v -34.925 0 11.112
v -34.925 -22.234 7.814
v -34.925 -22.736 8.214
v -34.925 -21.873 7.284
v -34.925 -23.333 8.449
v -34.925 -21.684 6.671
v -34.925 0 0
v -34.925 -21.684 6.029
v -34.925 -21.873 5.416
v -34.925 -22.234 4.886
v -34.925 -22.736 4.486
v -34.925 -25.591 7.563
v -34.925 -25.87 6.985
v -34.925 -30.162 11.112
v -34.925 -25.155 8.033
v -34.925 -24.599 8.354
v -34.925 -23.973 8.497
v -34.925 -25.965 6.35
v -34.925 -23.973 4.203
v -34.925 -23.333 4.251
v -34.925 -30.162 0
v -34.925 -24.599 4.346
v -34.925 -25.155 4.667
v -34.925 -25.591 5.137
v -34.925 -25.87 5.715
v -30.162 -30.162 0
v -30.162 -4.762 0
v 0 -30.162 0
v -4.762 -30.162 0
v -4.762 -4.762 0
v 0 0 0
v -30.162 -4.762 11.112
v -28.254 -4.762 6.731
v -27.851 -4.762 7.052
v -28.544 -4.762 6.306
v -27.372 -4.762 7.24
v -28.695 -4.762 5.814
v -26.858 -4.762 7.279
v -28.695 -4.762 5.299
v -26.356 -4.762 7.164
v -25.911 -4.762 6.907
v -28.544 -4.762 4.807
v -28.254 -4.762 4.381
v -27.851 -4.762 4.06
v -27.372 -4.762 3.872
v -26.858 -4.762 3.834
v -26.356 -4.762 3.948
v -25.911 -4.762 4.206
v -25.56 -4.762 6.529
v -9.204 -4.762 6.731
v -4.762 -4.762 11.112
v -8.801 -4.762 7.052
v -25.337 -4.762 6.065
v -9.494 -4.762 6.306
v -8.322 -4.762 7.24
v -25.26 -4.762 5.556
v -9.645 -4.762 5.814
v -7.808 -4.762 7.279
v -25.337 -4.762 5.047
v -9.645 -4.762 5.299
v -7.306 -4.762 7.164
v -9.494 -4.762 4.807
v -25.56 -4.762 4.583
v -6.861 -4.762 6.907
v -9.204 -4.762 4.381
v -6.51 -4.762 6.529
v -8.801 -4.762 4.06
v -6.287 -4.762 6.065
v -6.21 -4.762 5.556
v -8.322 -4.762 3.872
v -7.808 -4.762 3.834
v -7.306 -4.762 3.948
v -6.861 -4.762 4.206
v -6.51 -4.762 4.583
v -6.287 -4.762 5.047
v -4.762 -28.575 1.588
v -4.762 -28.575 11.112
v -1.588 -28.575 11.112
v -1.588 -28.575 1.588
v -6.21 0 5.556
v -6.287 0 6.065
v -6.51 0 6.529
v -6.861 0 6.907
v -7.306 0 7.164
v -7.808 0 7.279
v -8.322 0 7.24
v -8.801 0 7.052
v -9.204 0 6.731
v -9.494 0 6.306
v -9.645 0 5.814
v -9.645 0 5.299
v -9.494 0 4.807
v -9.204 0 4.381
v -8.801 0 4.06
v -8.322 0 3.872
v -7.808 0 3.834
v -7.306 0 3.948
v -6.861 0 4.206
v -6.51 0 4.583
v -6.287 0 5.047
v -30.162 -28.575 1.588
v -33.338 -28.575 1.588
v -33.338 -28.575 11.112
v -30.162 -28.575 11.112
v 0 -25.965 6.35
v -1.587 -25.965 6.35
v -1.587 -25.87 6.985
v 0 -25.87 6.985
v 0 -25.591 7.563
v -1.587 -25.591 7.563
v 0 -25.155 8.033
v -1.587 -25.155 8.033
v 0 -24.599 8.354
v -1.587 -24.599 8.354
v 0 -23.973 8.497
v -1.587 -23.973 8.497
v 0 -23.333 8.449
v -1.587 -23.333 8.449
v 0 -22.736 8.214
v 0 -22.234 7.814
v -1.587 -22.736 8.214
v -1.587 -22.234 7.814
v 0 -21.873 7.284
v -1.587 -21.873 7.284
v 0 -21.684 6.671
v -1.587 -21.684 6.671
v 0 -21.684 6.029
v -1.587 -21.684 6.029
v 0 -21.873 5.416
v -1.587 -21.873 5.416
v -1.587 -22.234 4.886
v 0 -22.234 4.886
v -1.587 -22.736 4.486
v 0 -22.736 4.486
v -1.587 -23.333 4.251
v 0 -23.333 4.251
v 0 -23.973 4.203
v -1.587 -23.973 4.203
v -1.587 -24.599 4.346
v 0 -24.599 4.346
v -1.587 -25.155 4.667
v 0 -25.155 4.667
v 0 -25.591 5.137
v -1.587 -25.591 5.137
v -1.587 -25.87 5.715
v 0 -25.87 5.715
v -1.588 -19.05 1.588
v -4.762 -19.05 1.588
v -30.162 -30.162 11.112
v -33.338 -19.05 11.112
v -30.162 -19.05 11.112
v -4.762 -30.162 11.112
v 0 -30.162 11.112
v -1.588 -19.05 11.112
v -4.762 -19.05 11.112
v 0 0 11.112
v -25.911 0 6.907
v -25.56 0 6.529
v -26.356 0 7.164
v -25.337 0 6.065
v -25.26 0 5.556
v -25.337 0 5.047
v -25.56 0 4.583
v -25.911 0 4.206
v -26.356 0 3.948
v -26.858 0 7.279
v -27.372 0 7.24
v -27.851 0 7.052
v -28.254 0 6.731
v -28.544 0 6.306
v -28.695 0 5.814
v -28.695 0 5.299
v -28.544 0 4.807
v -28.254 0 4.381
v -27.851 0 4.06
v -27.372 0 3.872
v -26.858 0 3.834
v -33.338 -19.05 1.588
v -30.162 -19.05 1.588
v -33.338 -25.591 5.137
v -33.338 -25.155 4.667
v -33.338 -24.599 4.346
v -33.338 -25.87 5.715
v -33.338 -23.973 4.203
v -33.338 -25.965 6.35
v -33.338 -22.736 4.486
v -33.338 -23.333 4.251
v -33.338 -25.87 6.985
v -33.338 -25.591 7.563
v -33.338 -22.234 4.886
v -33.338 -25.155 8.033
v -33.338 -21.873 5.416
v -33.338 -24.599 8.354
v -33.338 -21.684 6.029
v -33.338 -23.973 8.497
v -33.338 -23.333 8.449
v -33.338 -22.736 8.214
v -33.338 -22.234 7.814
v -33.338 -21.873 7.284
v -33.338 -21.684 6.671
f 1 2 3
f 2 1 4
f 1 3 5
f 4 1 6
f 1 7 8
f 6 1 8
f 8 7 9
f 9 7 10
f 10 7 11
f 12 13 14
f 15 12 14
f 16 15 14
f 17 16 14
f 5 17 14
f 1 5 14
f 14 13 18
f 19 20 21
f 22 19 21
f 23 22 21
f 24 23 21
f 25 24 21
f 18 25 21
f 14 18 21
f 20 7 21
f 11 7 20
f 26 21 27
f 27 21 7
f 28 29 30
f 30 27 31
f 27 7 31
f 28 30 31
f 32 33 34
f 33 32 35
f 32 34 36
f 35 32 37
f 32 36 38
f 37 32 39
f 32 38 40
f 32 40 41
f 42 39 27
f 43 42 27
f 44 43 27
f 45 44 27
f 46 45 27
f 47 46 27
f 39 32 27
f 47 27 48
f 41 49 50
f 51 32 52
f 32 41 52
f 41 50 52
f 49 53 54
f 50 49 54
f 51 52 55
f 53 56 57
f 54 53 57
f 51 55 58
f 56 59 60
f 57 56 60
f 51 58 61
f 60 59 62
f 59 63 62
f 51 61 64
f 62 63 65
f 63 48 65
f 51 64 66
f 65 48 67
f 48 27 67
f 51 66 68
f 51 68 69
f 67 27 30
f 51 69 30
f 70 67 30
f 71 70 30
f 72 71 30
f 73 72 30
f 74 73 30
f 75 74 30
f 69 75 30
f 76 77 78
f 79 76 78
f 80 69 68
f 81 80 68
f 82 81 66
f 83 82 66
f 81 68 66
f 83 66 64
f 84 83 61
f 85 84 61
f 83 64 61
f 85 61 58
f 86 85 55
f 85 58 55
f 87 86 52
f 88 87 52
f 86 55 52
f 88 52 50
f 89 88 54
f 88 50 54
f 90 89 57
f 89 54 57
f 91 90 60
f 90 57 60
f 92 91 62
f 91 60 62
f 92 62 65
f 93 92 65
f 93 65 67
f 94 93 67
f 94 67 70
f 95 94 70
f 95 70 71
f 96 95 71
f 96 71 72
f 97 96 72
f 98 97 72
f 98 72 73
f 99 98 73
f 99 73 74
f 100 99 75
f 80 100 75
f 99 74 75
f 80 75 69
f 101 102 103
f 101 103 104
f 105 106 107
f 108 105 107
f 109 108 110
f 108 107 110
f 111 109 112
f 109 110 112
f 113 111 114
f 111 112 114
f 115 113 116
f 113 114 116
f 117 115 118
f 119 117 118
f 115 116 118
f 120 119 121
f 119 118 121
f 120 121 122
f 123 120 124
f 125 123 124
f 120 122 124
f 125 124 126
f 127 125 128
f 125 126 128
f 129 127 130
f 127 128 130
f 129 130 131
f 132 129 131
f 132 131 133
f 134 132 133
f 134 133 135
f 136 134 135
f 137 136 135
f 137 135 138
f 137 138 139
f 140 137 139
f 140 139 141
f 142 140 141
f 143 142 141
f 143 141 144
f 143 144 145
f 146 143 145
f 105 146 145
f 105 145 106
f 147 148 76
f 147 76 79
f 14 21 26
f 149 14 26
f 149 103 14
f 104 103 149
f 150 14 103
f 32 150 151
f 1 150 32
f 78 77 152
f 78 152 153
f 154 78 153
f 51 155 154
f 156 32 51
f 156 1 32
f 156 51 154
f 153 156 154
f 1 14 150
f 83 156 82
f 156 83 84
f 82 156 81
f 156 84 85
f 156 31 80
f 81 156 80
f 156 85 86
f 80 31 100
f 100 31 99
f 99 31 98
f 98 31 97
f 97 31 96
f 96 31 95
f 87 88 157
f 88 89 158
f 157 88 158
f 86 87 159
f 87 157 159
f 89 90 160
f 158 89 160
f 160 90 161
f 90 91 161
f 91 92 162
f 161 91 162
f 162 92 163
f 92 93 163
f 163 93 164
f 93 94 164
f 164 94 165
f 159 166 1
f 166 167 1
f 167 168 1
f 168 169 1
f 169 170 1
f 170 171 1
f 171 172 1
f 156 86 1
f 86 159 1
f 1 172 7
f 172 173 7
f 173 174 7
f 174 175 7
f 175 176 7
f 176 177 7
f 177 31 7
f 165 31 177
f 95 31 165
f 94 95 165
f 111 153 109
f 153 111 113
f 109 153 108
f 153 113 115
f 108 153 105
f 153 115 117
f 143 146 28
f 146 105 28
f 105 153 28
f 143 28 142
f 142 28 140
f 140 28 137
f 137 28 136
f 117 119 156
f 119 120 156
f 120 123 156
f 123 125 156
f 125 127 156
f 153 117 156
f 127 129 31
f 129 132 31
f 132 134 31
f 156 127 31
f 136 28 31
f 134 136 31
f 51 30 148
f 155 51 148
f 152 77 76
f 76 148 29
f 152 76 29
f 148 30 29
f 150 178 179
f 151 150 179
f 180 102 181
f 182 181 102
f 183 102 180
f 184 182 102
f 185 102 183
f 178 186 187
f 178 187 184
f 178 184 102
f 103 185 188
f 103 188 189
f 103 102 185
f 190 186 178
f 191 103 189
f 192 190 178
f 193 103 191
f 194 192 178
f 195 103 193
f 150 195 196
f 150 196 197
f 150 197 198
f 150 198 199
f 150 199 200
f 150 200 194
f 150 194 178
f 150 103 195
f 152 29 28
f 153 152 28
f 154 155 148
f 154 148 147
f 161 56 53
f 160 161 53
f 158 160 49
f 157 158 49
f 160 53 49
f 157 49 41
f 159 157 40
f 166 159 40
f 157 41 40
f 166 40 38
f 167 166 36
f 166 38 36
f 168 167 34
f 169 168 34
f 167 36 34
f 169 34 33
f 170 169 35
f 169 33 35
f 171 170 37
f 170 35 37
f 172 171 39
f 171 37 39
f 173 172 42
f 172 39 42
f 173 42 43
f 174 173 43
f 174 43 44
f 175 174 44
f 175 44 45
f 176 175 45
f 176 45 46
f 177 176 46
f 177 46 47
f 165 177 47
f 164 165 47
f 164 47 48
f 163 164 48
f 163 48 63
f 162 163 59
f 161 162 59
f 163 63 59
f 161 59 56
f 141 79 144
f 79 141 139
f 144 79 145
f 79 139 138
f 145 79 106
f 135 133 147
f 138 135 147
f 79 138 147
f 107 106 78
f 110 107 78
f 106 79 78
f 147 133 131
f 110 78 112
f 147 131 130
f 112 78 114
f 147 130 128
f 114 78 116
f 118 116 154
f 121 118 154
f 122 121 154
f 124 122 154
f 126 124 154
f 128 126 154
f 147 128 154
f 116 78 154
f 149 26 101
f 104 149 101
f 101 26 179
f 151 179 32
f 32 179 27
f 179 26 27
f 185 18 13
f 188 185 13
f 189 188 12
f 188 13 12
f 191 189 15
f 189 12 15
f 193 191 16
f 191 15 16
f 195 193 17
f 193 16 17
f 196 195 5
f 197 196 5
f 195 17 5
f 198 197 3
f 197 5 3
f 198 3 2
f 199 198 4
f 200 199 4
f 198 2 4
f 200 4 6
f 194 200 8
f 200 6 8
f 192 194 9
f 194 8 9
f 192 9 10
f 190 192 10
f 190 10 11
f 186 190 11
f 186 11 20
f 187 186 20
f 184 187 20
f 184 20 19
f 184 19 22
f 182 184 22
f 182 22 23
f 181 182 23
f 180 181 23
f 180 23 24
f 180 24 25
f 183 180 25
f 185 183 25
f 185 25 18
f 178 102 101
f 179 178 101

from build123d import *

# Parameters (mm, degrees)
F1_DEPTH = 11.1125
F2_W     = 3.175
F2_H     = 9.525
F3_DEPTH = 9.525
F4_R     = 2.15265
F5_DEPTH = 34.925
F6_R     = 1.7272
F7_DEPTH = 4.7625


with BuildPart() as f1:
    # F0 (on Top) → F1 (new body)
    with BuildSketch(Plane.XY):
        Polygon((0, 0), (-34.925, 0), (-34.925, -30.1625), (-30.1625, -30.1625), (-30.1625, -4.7625), (-4.7625, -4.7625), (-4.7625, -30.1625), (0, -30.1625), align=None)
    extrude(amount=F1_DEPTH)

    # F2 (on face) → F3 (cut)
    with BuildSketch(Plane.XY.offset(11.1125)):
        with Locations((-31.75, -23.8125)):
            Rectangle(F2_W, F2_H)
        with Locations((-3.175, -23.8125)):
            Rectangle(F2_W, F2_H)
    extrude(amount=-F3_DEPTH, mode=Mode.SUBTRACT)

    # F4 (on face) → F5 (cut, through all)
    with BuildSketch(Plane(origin=(-34.925, 0, 0), x_dir=(0, -1, 0), z_dir=(-1, 0, 0))):
        with Locations((23.8125, 6.35)):
            Circle(F4_R)
    extrude(amount=-F5_DEPTH, mode=Mode.SUBTRACT)

    # F6 (on face) → F7 (cut, through all)
    with BuildSketch(Plane.XZ.offset(4.7625)):
        with Locations((-7.9375, 5.55625)):
            Circle(F6_R)
        with Locations((-26.9875, 5.55625)):
            Circle(F6_R)
    extrude(amount=-F7_DEPTH, mode=Mode.SUBTRACT)


solid = f1.part
